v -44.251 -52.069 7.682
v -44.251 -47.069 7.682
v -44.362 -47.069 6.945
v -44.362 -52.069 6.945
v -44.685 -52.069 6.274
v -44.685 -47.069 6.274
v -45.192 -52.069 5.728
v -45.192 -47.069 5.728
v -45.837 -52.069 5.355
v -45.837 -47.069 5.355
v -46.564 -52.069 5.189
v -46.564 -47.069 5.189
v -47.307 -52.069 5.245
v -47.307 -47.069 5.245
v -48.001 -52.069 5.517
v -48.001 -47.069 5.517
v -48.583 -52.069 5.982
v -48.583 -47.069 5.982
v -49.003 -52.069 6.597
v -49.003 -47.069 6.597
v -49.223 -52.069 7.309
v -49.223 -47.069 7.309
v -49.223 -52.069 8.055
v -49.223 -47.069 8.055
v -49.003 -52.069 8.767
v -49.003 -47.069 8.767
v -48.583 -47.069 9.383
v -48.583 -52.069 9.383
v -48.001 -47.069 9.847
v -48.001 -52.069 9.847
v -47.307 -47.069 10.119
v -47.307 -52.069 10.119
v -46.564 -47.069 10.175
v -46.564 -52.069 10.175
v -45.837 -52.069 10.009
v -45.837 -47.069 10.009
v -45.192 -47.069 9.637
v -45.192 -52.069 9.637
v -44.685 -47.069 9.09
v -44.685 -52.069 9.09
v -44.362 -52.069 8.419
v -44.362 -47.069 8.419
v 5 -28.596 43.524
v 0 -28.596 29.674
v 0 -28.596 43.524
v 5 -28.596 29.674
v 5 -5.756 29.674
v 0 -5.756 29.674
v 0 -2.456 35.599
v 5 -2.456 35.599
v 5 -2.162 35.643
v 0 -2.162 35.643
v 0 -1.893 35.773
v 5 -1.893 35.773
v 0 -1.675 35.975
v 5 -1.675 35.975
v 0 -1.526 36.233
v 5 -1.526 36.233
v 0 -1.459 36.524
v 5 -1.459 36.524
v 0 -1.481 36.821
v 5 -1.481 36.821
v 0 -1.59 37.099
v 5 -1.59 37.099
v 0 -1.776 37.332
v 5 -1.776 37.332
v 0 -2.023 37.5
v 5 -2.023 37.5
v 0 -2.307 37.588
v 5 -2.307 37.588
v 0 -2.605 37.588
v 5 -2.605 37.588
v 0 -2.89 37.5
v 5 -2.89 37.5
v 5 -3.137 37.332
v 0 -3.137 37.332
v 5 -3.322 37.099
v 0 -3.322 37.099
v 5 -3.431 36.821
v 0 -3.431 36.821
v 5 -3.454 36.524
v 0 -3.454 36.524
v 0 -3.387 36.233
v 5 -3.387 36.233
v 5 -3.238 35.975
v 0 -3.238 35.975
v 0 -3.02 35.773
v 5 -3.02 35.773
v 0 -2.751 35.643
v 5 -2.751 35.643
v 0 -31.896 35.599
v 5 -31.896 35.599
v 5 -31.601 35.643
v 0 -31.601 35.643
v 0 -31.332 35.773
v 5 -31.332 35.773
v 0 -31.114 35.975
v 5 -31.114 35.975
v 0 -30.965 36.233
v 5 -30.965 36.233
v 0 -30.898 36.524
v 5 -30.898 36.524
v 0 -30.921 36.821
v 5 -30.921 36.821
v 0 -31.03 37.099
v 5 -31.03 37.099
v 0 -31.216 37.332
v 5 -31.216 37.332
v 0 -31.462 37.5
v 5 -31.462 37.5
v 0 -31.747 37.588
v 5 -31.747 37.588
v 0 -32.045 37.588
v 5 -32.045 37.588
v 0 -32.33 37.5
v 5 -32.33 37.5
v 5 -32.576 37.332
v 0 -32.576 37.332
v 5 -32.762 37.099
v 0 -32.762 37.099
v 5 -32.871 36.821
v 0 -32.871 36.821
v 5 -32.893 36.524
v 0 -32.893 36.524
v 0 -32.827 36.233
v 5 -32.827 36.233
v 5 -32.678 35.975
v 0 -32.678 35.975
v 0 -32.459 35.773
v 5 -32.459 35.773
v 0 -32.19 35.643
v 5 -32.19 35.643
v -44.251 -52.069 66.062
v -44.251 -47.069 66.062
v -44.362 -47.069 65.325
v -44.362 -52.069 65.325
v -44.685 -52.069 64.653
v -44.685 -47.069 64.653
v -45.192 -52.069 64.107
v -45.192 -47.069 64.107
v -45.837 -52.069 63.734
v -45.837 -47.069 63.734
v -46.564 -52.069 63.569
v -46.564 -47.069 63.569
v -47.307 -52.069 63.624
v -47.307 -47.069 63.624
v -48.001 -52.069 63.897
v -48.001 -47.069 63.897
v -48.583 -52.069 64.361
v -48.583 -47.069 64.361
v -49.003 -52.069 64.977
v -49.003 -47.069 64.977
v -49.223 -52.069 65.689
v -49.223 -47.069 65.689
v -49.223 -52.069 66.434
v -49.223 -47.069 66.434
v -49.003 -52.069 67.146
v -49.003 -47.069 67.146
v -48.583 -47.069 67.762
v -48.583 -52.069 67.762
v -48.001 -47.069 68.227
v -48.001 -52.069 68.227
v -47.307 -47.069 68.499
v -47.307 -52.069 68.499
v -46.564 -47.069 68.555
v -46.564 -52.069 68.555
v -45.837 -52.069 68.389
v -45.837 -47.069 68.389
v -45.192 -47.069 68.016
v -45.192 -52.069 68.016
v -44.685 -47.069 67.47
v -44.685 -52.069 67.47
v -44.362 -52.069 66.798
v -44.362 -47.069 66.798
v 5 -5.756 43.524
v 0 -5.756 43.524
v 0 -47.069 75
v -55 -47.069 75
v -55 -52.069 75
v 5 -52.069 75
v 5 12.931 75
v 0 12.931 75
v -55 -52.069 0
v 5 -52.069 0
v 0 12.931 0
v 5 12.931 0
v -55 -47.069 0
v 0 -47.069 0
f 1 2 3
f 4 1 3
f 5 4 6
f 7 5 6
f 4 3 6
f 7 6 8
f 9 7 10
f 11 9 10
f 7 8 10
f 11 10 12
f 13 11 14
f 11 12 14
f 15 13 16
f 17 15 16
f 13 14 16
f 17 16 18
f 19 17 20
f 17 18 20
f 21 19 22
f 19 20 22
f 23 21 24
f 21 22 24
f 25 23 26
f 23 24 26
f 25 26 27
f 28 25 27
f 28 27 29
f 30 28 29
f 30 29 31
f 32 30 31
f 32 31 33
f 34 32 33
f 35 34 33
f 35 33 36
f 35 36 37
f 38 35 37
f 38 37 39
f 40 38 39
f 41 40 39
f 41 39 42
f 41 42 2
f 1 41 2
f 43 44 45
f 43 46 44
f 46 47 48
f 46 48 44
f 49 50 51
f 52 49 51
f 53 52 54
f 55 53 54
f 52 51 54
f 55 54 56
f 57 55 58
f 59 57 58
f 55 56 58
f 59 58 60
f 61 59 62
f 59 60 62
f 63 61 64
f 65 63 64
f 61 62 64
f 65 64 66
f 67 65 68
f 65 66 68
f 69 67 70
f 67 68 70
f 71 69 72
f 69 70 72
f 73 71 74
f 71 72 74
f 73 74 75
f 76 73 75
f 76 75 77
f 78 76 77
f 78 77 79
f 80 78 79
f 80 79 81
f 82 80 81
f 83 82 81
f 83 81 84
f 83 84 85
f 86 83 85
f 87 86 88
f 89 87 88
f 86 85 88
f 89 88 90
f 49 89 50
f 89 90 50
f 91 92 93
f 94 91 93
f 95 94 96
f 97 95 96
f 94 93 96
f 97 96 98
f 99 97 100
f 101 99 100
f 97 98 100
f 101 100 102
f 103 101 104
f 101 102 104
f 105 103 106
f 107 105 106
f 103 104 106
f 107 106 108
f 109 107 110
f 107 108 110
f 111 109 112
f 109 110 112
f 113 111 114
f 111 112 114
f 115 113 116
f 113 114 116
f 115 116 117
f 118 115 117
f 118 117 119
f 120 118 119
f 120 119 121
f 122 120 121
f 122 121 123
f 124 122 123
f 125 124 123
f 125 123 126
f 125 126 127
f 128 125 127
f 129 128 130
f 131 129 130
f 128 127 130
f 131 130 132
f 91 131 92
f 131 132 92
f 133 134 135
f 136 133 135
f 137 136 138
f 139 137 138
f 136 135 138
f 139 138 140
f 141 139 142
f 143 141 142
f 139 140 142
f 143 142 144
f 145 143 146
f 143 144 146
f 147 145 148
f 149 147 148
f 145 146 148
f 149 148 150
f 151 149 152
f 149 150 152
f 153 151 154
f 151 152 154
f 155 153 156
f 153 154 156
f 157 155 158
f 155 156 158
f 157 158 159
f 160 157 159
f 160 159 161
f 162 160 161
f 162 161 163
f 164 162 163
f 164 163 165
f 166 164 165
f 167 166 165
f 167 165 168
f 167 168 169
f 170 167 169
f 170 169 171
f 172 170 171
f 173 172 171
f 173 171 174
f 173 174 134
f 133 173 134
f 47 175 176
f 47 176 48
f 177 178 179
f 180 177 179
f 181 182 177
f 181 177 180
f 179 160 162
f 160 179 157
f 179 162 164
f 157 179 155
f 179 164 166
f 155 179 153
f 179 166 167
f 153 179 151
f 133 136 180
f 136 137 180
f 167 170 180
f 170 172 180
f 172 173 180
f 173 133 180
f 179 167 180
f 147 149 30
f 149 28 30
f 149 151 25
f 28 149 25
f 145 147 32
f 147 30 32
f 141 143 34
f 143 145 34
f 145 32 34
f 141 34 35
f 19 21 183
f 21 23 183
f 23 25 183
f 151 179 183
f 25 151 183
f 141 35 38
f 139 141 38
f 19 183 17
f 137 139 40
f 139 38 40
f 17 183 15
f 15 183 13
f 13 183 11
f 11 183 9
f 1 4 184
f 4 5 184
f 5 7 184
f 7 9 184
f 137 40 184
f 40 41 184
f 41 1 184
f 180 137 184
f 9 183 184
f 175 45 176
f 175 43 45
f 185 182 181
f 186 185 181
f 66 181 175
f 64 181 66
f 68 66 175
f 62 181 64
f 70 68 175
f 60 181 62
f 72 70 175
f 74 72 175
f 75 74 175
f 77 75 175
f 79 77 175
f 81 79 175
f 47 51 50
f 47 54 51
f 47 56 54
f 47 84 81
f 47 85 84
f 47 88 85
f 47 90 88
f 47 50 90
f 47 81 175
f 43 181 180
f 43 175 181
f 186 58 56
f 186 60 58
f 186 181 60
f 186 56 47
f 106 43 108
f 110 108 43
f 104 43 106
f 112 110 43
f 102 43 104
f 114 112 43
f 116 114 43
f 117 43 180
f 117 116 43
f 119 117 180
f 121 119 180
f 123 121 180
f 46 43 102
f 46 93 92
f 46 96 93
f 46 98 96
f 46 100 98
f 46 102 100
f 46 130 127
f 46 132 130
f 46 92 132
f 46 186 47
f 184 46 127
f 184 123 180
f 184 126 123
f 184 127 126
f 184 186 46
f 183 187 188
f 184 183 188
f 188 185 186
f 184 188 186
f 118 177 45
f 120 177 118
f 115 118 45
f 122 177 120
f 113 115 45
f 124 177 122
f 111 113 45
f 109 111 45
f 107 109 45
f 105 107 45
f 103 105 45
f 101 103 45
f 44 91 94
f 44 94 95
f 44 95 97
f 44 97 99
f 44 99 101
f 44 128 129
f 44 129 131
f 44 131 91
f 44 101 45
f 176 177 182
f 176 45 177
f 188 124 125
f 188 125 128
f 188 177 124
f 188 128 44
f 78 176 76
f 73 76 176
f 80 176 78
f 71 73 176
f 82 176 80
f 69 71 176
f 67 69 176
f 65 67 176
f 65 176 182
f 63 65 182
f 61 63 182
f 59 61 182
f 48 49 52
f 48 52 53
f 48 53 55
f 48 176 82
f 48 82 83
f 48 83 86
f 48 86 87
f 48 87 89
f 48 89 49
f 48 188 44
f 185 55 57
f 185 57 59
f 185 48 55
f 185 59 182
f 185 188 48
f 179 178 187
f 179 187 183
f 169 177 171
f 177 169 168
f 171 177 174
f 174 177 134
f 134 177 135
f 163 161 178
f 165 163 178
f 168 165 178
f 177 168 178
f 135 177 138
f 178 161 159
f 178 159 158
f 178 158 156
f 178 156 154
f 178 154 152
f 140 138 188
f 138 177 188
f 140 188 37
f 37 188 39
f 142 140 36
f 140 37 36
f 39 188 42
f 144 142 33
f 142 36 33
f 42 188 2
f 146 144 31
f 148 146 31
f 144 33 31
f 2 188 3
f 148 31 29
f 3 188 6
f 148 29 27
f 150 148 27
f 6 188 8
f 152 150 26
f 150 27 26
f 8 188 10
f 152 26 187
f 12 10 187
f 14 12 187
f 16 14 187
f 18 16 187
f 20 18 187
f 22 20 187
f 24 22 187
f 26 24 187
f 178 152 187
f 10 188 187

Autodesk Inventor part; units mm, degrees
ref_plane "YZ Plane" through (0, 0, 0) normal (1, 0, 0) x (0, 1, 0)
ref_plane "XZ Plane" through (0, 0, 0) normal (0, 1, 0) x (-1, 0, 0)
ref_plane "XY Plane" through (0, 0, 0) normal (0, 0, 1) x (1, 0, 0)
sketch "Sketch1" plane through (0, 0, 0) normal (0, 0, 1) x (1, 0, 0)
  point P0 (0, 0)
sketch "Sketch2" plane through (0, 0, 0) normal (0, 0, 1) x (1, 0, 0)
  line L0 (0, 12.9308) -> (5, 12.9308)
  line L1 (5, 12.9308) -> (5, -47.0692)
  line L2 (0, -47.0692) -> (0, 12.9308)
  line L3 (0, -47.0692) -> (-55, -47.0692)
  line L4 (-55, -47.0692) -> (-55, -52.0692)
  line L5 (-55, -52.0692) -> (5, -52.0692)
  line L6 (5, -52.0692) -> (5, -47.0692)
  point P0 (0, 0)
extrude "Extrusion1" add sketch "Sketch2" along normal blind 75
sketch "Sketch3" plane through (-55, -47.0692, 0) normal (0, 1, 0) x (1, 0, 0)
  circle A0 centre (8.2492, -7.6821) radius 2.5
  circle A1 centre (8.2492, -66.0616) radius 2.5
  point P0 (55, 0)
  dimension "d6" = 5
  dimension "d7" = 5
extrude "Extrusion2" cut sketch "Sketch3" against normal blind 75
sketch "Sketch4" plane through (5, -52.0692, 0) normal (1, 0, 0) x (0, 0, -1)
  line L0 (-43.5238, 46.3128) -> (-29.6738, 46.3128)
  line L1 (-29.6738, 46.3128) -> (-29.6738, 23.4735)
  line L2 (-29.6738, 23.4735) -> (-43.5238, 23.4735)
  line L3 (-43.5238, 23.4735) -> (-43.5238, 46.3128)
  point P0 (0, 52.0692)
extrude "Extrusion3" cut sketch "Sketch4" against normal blind 75
sketch "Sketch5" plane through (5, -52.0692, 0) normal (1, 0, 0) x (0, 0, -1)
  line L0 (-43.5238, 46.3128) -> (-43.5238, 23.4735) projected
  line L1 (-43.5238, 46.3128) -> (-29.6738, 46.3128) projected
  line L2 (-43.5238, 46.3128) -> (-29.6738, 46.3128)
  line L3 (-43.5238, 46.3128) -> (-36.5988, 46.3128)
  circle A0 centre (-36.5988, 49.6128) radius 1
  circle A1 centre (-36.5988, 20.1735) radius 1
  point P0 (0, 52.0692)
extrude "Extrusion4" cut sketch "Sketch5" against normal blind 75
